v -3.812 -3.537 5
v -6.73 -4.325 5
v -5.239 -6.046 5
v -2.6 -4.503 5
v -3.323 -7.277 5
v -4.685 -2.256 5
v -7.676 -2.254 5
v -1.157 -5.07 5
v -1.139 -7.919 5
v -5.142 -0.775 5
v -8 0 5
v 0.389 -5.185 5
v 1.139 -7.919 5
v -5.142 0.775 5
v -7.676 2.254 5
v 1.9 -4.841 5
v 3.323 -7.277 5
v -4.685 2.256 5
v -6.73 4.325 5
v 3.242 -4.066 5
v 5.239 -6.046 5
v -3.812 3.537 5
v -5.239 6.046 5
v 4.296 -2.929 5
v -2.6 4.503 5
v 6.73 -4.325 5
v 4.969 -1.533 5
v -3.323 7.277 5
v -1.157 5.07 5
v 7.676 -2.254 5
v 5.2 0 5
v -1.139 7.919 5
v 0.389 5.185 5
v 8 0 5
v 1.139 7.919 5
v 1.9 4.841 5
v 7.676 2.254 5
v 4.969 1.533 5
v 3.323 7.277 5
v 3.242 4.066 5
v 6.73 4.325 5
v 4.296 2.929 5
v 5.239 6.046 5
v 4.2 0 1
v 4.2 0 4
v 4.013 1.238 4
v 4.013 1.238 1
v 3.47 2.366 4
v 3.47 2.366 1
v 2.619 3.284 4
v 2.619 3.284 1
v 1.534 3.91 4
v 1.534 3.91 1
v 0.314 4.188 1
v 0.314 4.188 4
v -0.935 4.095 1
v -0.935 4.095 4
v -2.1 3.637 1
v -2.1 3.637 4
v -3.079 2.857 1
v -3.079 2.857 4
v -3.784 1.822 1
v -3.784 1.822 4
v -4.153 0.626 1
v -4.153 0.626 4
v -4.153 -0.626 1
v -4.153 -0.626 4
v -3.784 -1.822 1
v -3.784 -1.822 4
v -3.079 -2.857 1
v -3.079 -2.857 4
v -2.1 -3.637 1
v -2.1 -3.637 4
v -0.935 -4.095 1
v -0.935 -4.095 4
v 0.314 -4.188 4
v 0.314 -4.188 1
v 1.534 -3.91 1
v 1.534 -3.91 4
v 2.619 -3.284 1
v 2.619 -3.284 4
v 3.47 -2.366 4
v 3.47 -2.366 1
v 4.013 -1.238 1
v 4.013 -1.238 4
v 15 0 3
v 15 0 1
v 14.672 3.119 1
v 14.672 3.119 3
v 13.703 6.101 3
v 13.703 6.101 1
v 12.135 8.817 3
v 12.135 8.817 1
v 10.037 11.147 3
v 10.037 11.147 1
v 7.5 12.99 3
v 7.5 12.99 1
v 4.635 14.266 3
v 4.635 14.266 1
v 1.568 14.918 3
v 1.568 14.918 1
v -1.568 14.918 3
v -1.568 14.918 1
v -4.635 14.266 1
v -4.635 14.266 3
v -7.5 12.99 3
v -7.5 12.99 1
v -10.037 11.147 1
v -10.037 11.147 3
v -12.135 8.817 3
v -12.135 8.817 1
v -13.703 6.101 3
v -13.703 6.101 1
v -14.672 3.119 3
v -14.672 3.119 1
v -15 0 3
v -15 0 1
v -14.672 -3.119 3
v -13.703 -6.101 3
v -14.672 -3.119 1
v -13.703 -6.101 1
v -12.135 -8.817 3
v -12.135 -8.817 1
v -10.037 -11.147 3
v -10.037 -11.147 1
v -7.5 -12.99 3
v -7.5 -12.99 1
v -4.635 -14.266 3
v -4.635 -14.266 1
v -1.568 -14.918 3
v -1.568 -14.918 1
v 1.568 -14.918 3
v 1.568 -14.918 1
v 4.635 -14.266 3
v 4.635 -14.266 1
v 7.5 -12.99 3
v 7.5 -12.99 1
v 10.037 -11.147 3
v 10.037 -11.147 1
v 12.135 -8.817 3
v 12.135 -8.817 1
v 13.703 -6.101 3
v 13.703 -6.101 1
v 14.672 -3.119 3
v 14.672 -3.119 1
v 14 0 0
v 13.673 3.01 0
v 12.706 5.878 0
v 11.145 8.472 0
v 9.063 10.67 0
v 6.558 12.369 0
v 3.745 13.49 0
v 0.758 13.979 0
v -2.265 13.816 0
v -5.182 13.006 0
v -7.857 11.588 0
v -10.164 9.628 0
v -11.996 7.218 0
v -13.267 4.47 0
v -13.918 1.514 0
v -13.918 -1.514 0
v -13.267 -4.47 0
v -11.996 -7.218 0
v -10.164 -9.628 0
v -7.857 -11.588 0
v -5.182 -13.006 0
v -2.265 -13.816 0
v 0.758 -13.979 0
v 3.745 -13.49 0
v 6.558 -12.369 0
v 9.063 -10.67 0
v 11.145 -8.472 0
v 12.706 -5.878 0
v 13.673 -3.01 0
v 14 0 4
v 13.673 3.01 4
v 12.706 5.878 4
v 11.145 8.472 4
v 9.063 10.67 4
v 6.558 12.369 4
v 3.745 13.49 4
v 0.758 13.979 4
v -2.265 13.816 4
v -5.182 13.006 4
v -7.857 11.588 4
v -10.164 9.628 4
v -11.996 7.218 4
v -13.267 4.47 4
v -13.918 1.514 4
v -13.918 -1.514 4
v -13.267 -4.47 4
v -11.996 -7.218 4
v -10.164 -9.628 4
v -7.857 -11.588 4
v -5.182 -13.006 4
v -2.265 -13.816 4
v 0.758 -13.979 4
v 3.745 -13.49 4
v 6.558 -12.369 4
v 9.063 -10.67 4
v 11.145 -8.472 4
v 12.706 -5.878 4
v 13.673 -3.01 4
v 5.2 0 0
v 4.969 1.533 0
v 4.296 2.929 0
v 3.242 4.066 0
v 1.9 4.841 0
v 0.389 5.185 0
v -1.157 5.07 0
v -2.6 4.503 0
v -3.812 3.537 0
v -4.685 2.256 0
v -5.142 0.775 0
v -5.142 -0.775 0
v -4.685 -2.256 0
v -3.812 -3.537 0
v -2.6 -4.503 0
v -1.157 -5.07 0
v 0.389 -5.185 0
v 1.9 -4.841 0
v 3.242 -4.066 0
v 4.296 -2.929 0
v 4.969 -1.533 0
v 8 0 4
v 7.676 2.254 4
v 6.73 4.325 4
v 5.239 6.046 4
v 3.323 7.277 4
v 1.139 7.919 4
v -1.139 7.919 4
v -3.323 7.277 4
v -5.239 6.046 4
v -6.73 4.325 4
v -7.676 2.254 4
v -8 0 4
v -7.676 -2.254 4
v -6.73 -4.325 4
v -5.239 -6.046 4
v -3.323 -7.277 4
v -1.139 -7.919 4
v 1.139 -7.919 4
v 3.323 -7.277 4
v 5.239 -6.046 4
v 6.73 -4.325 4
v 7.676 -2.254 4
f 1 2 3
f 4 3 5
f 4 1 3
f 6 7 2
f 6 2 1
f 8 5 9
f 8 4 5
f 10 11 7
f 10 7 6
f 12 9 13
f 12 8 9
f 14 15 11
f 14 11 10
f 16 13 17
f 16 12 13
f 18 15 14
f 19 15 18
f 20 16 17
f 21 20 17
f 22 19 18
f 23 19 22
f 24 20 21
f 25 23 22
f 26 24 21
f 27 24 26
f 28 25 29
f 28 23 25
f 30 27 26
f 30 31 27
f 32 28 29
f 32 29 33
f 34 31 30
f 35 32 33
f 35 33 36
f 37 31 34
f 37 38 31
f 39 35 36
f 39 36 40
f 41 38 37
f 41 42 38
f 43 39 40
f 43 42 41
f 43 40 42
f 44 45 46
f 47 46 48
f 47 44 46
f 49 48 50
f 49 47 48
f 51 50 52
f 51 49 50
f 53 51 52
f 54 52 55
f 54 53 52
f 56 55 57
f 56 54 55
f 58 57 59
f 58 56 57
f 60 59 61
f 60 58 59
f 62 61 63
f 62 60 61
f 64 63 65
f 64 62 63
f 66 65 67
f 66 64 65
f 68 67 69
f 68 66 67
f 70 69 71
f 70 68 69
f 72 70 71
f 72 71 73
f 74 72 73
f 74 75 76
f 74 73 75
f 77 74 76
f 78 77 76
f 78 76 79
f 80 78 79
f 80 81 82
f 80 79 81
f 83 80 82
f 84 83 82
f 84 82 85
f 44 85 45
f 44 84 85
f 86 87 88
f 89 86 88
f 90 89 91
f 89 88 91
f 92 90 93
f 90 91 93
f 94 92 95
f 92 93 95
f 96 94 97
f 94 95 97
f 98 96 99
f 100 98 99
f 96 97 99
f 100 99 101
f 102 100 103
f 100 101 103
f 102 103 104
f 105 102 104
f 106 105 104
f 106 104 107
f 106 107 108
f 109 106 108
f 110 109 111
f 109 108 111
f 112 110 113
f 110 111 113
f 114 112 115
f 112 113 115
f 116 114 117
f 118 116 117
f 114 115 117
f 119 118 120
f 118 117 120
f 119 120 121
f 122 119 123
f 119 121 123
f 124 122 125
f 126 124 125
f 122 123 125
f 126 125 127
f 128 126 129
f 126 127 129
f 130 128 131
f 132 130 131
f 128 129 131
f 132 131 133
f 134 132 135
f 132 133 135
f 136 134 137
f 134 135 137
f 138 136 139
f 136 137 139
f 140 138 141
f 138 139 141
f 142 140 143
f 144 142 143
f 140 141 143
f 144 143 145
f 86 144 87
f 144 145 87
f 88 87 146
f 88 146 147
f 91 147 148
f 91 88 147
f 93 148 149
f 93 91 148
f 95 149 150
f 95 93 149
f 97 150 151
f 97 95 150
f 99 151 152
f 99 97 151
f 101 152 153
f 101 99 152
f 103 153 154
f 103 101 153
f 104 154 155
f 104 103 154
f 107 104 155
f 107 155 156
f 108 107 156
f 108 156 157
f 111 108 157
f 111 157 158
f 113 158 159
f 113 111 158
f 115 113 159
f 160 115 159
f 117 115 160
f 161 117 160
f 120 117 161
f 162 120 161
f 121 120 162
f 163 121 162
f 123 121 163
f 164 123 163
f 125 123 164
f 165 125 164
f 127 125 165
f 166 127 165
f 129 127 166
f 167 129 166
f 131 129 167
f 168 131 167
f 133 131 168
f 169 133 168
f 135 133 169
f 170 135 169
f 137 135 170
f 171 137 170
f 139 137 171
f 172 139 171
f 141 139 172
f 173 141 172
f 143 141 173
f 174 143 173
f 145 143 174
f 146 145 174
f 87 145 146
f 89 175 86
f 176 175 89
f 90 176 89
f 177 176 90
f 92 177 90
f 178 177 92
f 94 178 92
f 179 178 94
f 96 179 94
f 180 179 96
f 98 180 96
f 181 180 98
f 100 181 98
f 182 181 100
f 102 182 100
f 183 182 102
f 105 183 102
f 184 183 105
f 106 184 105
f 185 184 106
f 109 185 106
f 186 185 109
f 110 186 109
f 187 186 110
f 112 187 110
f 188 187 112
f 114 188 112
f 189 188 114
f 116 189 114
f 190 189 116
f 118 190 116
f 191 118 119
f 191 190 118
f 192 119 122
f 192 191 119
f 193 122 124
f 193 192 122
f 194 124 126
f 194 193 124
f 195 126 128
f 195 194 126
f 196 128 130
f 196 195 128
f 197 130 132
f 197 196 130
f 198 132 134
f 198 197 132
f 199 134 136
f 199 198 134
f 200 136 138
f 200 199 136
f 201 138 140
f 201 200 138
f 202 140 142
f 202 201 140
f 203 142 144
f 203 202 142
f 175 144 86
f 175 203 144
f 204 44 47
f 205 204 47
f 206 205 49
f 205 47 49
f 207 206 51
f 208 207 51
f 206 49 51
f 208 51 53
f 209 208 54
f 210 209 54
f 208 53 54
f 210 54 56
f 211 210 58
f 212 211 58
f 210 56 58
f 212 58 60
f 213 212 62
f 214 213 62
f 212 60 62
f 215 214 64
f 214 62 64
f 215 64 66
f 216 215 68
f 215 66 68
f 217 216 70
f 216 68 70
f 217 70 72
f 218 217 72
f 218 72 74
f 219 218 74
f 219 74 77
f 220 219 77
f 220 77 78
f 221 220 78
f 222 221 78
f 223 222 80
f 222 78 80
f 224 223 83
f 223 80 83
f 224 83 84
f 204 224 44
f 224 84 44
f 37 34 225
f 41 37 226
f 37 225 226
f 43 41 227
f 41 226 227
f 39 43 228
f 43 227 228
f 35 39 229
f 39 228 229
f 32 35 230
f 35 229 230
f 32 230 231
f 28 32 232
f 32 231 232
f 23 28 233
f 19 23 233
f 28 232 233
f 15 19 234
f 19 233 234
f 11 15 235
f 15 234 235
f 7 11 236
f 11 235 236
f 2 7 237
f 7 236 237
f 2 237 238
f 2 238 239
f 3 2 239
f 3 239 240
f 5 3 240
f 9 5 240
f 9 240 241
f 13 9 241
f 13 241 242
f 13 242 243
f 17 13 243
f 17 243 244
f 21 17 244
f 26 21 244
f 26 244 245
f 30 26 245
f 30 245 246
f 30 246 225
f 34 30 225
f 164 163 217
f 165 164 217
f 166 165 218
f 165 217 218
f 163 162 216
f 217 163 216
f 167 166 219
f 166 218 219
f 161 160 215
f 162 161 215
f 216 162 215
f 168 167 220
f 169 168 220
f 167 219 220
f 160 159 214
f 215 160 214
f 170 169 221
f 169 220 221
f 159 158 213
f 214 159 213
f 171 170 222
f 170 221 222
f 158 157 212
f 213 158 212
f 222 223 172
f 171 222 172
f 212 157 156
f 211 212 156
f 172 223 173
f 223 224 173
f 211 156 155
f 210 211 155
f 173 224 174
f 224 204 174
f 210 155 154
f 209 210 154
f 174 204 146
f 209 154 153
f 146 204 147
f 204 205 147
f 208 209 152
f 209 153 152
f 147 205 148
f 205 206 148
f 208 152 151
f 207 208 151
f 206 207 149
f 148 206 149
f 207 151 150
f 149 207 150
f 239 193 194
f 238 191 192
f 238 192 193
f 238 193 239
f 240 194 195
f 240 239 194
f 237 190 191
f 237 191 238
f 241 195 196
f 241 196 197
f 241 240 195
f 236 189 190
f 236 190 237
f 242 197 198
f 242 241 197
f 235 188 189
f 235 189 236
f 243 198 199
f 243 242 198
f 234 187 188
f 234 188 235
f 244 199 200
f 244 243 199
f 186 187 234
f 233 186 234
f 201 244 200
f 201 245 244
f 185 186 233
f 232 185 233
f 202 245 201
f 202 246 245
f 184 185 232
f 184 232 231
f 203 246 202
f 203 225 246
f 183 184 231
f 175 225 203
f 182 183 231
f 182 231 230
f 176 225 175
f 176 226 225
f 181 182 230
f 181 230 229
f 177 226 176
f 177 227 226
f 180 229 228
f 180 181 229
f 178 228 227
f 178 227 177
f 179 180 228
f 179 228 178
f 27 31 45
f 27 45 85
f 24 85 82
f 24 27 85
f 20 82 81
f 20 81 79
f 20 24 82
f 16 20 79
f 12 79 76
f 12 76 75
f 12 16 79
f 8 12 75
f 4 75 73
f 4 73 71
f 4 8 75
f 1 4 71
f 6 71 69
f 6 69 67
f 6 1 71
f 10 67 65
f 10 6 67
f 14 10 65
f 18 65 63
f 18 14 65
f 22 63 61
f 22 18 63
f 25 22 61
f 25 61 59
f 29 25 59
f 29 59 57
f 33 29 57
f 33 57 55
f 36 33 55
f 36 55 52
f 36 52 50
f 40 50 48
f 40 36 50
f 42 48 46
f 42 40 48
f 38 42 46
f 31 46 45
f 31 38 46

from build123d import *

# Parameters (mm, degrees)
CYLINDER_R        = 15
CYLINDER_DEPTH    = 4
CYLINDER002_R     = 8
CYLINDER002_DEPTH = 5
CYLINDER003_R     = 4.2
CYLINDER003_DEPTH = 10
CHAMFER_SIZE      = 1
CHAMFER001_SIZE   = 1


with BuildPart() as part:
    # Cylinder → Cylinder (join)
    with BuildSketch(Plane.XY):
        Circle(CYLINDER_R)
    extrude(amount=CYLINDER_DEPTH)

    # Cylinder002 → Cylinder002 (join)
    with BuildSketch(Plane.XY):
        Circle(CYLINDER002_R)
    extrude(amount=CYLINDER002_DEPTH)

    # Cylinder003 → Cylinder003 (cut)
    with BuildSketch(Plane.XY):
        Circle(CYLINDER003_R)
    extrude(amount=CYLINDER003_DEPTH, mode=Mode.SUBTRACT)

    # Chamfer
    chamfer_edges = [part.edges().sort_by_distance(p)[0] for p in [
        (-15, 0, 4),
        (15, 0, 2),
        (-15, 0, 0),
    ]]
    chamfer(chamfer_edges, length=CHAMFER_SIZE)

    # Chamfer001
    chamfer001_edges = [part.edges().sort_by_distance(p)[0] for p in [
        (-4.2, 0, 5),
        (4.2, 0, 2.5),
        (-4.2, 0, 0),
    ]]
    chamfer(chamfer001_edges, length=CHAMFER001_SIZE)


solid = part.part
